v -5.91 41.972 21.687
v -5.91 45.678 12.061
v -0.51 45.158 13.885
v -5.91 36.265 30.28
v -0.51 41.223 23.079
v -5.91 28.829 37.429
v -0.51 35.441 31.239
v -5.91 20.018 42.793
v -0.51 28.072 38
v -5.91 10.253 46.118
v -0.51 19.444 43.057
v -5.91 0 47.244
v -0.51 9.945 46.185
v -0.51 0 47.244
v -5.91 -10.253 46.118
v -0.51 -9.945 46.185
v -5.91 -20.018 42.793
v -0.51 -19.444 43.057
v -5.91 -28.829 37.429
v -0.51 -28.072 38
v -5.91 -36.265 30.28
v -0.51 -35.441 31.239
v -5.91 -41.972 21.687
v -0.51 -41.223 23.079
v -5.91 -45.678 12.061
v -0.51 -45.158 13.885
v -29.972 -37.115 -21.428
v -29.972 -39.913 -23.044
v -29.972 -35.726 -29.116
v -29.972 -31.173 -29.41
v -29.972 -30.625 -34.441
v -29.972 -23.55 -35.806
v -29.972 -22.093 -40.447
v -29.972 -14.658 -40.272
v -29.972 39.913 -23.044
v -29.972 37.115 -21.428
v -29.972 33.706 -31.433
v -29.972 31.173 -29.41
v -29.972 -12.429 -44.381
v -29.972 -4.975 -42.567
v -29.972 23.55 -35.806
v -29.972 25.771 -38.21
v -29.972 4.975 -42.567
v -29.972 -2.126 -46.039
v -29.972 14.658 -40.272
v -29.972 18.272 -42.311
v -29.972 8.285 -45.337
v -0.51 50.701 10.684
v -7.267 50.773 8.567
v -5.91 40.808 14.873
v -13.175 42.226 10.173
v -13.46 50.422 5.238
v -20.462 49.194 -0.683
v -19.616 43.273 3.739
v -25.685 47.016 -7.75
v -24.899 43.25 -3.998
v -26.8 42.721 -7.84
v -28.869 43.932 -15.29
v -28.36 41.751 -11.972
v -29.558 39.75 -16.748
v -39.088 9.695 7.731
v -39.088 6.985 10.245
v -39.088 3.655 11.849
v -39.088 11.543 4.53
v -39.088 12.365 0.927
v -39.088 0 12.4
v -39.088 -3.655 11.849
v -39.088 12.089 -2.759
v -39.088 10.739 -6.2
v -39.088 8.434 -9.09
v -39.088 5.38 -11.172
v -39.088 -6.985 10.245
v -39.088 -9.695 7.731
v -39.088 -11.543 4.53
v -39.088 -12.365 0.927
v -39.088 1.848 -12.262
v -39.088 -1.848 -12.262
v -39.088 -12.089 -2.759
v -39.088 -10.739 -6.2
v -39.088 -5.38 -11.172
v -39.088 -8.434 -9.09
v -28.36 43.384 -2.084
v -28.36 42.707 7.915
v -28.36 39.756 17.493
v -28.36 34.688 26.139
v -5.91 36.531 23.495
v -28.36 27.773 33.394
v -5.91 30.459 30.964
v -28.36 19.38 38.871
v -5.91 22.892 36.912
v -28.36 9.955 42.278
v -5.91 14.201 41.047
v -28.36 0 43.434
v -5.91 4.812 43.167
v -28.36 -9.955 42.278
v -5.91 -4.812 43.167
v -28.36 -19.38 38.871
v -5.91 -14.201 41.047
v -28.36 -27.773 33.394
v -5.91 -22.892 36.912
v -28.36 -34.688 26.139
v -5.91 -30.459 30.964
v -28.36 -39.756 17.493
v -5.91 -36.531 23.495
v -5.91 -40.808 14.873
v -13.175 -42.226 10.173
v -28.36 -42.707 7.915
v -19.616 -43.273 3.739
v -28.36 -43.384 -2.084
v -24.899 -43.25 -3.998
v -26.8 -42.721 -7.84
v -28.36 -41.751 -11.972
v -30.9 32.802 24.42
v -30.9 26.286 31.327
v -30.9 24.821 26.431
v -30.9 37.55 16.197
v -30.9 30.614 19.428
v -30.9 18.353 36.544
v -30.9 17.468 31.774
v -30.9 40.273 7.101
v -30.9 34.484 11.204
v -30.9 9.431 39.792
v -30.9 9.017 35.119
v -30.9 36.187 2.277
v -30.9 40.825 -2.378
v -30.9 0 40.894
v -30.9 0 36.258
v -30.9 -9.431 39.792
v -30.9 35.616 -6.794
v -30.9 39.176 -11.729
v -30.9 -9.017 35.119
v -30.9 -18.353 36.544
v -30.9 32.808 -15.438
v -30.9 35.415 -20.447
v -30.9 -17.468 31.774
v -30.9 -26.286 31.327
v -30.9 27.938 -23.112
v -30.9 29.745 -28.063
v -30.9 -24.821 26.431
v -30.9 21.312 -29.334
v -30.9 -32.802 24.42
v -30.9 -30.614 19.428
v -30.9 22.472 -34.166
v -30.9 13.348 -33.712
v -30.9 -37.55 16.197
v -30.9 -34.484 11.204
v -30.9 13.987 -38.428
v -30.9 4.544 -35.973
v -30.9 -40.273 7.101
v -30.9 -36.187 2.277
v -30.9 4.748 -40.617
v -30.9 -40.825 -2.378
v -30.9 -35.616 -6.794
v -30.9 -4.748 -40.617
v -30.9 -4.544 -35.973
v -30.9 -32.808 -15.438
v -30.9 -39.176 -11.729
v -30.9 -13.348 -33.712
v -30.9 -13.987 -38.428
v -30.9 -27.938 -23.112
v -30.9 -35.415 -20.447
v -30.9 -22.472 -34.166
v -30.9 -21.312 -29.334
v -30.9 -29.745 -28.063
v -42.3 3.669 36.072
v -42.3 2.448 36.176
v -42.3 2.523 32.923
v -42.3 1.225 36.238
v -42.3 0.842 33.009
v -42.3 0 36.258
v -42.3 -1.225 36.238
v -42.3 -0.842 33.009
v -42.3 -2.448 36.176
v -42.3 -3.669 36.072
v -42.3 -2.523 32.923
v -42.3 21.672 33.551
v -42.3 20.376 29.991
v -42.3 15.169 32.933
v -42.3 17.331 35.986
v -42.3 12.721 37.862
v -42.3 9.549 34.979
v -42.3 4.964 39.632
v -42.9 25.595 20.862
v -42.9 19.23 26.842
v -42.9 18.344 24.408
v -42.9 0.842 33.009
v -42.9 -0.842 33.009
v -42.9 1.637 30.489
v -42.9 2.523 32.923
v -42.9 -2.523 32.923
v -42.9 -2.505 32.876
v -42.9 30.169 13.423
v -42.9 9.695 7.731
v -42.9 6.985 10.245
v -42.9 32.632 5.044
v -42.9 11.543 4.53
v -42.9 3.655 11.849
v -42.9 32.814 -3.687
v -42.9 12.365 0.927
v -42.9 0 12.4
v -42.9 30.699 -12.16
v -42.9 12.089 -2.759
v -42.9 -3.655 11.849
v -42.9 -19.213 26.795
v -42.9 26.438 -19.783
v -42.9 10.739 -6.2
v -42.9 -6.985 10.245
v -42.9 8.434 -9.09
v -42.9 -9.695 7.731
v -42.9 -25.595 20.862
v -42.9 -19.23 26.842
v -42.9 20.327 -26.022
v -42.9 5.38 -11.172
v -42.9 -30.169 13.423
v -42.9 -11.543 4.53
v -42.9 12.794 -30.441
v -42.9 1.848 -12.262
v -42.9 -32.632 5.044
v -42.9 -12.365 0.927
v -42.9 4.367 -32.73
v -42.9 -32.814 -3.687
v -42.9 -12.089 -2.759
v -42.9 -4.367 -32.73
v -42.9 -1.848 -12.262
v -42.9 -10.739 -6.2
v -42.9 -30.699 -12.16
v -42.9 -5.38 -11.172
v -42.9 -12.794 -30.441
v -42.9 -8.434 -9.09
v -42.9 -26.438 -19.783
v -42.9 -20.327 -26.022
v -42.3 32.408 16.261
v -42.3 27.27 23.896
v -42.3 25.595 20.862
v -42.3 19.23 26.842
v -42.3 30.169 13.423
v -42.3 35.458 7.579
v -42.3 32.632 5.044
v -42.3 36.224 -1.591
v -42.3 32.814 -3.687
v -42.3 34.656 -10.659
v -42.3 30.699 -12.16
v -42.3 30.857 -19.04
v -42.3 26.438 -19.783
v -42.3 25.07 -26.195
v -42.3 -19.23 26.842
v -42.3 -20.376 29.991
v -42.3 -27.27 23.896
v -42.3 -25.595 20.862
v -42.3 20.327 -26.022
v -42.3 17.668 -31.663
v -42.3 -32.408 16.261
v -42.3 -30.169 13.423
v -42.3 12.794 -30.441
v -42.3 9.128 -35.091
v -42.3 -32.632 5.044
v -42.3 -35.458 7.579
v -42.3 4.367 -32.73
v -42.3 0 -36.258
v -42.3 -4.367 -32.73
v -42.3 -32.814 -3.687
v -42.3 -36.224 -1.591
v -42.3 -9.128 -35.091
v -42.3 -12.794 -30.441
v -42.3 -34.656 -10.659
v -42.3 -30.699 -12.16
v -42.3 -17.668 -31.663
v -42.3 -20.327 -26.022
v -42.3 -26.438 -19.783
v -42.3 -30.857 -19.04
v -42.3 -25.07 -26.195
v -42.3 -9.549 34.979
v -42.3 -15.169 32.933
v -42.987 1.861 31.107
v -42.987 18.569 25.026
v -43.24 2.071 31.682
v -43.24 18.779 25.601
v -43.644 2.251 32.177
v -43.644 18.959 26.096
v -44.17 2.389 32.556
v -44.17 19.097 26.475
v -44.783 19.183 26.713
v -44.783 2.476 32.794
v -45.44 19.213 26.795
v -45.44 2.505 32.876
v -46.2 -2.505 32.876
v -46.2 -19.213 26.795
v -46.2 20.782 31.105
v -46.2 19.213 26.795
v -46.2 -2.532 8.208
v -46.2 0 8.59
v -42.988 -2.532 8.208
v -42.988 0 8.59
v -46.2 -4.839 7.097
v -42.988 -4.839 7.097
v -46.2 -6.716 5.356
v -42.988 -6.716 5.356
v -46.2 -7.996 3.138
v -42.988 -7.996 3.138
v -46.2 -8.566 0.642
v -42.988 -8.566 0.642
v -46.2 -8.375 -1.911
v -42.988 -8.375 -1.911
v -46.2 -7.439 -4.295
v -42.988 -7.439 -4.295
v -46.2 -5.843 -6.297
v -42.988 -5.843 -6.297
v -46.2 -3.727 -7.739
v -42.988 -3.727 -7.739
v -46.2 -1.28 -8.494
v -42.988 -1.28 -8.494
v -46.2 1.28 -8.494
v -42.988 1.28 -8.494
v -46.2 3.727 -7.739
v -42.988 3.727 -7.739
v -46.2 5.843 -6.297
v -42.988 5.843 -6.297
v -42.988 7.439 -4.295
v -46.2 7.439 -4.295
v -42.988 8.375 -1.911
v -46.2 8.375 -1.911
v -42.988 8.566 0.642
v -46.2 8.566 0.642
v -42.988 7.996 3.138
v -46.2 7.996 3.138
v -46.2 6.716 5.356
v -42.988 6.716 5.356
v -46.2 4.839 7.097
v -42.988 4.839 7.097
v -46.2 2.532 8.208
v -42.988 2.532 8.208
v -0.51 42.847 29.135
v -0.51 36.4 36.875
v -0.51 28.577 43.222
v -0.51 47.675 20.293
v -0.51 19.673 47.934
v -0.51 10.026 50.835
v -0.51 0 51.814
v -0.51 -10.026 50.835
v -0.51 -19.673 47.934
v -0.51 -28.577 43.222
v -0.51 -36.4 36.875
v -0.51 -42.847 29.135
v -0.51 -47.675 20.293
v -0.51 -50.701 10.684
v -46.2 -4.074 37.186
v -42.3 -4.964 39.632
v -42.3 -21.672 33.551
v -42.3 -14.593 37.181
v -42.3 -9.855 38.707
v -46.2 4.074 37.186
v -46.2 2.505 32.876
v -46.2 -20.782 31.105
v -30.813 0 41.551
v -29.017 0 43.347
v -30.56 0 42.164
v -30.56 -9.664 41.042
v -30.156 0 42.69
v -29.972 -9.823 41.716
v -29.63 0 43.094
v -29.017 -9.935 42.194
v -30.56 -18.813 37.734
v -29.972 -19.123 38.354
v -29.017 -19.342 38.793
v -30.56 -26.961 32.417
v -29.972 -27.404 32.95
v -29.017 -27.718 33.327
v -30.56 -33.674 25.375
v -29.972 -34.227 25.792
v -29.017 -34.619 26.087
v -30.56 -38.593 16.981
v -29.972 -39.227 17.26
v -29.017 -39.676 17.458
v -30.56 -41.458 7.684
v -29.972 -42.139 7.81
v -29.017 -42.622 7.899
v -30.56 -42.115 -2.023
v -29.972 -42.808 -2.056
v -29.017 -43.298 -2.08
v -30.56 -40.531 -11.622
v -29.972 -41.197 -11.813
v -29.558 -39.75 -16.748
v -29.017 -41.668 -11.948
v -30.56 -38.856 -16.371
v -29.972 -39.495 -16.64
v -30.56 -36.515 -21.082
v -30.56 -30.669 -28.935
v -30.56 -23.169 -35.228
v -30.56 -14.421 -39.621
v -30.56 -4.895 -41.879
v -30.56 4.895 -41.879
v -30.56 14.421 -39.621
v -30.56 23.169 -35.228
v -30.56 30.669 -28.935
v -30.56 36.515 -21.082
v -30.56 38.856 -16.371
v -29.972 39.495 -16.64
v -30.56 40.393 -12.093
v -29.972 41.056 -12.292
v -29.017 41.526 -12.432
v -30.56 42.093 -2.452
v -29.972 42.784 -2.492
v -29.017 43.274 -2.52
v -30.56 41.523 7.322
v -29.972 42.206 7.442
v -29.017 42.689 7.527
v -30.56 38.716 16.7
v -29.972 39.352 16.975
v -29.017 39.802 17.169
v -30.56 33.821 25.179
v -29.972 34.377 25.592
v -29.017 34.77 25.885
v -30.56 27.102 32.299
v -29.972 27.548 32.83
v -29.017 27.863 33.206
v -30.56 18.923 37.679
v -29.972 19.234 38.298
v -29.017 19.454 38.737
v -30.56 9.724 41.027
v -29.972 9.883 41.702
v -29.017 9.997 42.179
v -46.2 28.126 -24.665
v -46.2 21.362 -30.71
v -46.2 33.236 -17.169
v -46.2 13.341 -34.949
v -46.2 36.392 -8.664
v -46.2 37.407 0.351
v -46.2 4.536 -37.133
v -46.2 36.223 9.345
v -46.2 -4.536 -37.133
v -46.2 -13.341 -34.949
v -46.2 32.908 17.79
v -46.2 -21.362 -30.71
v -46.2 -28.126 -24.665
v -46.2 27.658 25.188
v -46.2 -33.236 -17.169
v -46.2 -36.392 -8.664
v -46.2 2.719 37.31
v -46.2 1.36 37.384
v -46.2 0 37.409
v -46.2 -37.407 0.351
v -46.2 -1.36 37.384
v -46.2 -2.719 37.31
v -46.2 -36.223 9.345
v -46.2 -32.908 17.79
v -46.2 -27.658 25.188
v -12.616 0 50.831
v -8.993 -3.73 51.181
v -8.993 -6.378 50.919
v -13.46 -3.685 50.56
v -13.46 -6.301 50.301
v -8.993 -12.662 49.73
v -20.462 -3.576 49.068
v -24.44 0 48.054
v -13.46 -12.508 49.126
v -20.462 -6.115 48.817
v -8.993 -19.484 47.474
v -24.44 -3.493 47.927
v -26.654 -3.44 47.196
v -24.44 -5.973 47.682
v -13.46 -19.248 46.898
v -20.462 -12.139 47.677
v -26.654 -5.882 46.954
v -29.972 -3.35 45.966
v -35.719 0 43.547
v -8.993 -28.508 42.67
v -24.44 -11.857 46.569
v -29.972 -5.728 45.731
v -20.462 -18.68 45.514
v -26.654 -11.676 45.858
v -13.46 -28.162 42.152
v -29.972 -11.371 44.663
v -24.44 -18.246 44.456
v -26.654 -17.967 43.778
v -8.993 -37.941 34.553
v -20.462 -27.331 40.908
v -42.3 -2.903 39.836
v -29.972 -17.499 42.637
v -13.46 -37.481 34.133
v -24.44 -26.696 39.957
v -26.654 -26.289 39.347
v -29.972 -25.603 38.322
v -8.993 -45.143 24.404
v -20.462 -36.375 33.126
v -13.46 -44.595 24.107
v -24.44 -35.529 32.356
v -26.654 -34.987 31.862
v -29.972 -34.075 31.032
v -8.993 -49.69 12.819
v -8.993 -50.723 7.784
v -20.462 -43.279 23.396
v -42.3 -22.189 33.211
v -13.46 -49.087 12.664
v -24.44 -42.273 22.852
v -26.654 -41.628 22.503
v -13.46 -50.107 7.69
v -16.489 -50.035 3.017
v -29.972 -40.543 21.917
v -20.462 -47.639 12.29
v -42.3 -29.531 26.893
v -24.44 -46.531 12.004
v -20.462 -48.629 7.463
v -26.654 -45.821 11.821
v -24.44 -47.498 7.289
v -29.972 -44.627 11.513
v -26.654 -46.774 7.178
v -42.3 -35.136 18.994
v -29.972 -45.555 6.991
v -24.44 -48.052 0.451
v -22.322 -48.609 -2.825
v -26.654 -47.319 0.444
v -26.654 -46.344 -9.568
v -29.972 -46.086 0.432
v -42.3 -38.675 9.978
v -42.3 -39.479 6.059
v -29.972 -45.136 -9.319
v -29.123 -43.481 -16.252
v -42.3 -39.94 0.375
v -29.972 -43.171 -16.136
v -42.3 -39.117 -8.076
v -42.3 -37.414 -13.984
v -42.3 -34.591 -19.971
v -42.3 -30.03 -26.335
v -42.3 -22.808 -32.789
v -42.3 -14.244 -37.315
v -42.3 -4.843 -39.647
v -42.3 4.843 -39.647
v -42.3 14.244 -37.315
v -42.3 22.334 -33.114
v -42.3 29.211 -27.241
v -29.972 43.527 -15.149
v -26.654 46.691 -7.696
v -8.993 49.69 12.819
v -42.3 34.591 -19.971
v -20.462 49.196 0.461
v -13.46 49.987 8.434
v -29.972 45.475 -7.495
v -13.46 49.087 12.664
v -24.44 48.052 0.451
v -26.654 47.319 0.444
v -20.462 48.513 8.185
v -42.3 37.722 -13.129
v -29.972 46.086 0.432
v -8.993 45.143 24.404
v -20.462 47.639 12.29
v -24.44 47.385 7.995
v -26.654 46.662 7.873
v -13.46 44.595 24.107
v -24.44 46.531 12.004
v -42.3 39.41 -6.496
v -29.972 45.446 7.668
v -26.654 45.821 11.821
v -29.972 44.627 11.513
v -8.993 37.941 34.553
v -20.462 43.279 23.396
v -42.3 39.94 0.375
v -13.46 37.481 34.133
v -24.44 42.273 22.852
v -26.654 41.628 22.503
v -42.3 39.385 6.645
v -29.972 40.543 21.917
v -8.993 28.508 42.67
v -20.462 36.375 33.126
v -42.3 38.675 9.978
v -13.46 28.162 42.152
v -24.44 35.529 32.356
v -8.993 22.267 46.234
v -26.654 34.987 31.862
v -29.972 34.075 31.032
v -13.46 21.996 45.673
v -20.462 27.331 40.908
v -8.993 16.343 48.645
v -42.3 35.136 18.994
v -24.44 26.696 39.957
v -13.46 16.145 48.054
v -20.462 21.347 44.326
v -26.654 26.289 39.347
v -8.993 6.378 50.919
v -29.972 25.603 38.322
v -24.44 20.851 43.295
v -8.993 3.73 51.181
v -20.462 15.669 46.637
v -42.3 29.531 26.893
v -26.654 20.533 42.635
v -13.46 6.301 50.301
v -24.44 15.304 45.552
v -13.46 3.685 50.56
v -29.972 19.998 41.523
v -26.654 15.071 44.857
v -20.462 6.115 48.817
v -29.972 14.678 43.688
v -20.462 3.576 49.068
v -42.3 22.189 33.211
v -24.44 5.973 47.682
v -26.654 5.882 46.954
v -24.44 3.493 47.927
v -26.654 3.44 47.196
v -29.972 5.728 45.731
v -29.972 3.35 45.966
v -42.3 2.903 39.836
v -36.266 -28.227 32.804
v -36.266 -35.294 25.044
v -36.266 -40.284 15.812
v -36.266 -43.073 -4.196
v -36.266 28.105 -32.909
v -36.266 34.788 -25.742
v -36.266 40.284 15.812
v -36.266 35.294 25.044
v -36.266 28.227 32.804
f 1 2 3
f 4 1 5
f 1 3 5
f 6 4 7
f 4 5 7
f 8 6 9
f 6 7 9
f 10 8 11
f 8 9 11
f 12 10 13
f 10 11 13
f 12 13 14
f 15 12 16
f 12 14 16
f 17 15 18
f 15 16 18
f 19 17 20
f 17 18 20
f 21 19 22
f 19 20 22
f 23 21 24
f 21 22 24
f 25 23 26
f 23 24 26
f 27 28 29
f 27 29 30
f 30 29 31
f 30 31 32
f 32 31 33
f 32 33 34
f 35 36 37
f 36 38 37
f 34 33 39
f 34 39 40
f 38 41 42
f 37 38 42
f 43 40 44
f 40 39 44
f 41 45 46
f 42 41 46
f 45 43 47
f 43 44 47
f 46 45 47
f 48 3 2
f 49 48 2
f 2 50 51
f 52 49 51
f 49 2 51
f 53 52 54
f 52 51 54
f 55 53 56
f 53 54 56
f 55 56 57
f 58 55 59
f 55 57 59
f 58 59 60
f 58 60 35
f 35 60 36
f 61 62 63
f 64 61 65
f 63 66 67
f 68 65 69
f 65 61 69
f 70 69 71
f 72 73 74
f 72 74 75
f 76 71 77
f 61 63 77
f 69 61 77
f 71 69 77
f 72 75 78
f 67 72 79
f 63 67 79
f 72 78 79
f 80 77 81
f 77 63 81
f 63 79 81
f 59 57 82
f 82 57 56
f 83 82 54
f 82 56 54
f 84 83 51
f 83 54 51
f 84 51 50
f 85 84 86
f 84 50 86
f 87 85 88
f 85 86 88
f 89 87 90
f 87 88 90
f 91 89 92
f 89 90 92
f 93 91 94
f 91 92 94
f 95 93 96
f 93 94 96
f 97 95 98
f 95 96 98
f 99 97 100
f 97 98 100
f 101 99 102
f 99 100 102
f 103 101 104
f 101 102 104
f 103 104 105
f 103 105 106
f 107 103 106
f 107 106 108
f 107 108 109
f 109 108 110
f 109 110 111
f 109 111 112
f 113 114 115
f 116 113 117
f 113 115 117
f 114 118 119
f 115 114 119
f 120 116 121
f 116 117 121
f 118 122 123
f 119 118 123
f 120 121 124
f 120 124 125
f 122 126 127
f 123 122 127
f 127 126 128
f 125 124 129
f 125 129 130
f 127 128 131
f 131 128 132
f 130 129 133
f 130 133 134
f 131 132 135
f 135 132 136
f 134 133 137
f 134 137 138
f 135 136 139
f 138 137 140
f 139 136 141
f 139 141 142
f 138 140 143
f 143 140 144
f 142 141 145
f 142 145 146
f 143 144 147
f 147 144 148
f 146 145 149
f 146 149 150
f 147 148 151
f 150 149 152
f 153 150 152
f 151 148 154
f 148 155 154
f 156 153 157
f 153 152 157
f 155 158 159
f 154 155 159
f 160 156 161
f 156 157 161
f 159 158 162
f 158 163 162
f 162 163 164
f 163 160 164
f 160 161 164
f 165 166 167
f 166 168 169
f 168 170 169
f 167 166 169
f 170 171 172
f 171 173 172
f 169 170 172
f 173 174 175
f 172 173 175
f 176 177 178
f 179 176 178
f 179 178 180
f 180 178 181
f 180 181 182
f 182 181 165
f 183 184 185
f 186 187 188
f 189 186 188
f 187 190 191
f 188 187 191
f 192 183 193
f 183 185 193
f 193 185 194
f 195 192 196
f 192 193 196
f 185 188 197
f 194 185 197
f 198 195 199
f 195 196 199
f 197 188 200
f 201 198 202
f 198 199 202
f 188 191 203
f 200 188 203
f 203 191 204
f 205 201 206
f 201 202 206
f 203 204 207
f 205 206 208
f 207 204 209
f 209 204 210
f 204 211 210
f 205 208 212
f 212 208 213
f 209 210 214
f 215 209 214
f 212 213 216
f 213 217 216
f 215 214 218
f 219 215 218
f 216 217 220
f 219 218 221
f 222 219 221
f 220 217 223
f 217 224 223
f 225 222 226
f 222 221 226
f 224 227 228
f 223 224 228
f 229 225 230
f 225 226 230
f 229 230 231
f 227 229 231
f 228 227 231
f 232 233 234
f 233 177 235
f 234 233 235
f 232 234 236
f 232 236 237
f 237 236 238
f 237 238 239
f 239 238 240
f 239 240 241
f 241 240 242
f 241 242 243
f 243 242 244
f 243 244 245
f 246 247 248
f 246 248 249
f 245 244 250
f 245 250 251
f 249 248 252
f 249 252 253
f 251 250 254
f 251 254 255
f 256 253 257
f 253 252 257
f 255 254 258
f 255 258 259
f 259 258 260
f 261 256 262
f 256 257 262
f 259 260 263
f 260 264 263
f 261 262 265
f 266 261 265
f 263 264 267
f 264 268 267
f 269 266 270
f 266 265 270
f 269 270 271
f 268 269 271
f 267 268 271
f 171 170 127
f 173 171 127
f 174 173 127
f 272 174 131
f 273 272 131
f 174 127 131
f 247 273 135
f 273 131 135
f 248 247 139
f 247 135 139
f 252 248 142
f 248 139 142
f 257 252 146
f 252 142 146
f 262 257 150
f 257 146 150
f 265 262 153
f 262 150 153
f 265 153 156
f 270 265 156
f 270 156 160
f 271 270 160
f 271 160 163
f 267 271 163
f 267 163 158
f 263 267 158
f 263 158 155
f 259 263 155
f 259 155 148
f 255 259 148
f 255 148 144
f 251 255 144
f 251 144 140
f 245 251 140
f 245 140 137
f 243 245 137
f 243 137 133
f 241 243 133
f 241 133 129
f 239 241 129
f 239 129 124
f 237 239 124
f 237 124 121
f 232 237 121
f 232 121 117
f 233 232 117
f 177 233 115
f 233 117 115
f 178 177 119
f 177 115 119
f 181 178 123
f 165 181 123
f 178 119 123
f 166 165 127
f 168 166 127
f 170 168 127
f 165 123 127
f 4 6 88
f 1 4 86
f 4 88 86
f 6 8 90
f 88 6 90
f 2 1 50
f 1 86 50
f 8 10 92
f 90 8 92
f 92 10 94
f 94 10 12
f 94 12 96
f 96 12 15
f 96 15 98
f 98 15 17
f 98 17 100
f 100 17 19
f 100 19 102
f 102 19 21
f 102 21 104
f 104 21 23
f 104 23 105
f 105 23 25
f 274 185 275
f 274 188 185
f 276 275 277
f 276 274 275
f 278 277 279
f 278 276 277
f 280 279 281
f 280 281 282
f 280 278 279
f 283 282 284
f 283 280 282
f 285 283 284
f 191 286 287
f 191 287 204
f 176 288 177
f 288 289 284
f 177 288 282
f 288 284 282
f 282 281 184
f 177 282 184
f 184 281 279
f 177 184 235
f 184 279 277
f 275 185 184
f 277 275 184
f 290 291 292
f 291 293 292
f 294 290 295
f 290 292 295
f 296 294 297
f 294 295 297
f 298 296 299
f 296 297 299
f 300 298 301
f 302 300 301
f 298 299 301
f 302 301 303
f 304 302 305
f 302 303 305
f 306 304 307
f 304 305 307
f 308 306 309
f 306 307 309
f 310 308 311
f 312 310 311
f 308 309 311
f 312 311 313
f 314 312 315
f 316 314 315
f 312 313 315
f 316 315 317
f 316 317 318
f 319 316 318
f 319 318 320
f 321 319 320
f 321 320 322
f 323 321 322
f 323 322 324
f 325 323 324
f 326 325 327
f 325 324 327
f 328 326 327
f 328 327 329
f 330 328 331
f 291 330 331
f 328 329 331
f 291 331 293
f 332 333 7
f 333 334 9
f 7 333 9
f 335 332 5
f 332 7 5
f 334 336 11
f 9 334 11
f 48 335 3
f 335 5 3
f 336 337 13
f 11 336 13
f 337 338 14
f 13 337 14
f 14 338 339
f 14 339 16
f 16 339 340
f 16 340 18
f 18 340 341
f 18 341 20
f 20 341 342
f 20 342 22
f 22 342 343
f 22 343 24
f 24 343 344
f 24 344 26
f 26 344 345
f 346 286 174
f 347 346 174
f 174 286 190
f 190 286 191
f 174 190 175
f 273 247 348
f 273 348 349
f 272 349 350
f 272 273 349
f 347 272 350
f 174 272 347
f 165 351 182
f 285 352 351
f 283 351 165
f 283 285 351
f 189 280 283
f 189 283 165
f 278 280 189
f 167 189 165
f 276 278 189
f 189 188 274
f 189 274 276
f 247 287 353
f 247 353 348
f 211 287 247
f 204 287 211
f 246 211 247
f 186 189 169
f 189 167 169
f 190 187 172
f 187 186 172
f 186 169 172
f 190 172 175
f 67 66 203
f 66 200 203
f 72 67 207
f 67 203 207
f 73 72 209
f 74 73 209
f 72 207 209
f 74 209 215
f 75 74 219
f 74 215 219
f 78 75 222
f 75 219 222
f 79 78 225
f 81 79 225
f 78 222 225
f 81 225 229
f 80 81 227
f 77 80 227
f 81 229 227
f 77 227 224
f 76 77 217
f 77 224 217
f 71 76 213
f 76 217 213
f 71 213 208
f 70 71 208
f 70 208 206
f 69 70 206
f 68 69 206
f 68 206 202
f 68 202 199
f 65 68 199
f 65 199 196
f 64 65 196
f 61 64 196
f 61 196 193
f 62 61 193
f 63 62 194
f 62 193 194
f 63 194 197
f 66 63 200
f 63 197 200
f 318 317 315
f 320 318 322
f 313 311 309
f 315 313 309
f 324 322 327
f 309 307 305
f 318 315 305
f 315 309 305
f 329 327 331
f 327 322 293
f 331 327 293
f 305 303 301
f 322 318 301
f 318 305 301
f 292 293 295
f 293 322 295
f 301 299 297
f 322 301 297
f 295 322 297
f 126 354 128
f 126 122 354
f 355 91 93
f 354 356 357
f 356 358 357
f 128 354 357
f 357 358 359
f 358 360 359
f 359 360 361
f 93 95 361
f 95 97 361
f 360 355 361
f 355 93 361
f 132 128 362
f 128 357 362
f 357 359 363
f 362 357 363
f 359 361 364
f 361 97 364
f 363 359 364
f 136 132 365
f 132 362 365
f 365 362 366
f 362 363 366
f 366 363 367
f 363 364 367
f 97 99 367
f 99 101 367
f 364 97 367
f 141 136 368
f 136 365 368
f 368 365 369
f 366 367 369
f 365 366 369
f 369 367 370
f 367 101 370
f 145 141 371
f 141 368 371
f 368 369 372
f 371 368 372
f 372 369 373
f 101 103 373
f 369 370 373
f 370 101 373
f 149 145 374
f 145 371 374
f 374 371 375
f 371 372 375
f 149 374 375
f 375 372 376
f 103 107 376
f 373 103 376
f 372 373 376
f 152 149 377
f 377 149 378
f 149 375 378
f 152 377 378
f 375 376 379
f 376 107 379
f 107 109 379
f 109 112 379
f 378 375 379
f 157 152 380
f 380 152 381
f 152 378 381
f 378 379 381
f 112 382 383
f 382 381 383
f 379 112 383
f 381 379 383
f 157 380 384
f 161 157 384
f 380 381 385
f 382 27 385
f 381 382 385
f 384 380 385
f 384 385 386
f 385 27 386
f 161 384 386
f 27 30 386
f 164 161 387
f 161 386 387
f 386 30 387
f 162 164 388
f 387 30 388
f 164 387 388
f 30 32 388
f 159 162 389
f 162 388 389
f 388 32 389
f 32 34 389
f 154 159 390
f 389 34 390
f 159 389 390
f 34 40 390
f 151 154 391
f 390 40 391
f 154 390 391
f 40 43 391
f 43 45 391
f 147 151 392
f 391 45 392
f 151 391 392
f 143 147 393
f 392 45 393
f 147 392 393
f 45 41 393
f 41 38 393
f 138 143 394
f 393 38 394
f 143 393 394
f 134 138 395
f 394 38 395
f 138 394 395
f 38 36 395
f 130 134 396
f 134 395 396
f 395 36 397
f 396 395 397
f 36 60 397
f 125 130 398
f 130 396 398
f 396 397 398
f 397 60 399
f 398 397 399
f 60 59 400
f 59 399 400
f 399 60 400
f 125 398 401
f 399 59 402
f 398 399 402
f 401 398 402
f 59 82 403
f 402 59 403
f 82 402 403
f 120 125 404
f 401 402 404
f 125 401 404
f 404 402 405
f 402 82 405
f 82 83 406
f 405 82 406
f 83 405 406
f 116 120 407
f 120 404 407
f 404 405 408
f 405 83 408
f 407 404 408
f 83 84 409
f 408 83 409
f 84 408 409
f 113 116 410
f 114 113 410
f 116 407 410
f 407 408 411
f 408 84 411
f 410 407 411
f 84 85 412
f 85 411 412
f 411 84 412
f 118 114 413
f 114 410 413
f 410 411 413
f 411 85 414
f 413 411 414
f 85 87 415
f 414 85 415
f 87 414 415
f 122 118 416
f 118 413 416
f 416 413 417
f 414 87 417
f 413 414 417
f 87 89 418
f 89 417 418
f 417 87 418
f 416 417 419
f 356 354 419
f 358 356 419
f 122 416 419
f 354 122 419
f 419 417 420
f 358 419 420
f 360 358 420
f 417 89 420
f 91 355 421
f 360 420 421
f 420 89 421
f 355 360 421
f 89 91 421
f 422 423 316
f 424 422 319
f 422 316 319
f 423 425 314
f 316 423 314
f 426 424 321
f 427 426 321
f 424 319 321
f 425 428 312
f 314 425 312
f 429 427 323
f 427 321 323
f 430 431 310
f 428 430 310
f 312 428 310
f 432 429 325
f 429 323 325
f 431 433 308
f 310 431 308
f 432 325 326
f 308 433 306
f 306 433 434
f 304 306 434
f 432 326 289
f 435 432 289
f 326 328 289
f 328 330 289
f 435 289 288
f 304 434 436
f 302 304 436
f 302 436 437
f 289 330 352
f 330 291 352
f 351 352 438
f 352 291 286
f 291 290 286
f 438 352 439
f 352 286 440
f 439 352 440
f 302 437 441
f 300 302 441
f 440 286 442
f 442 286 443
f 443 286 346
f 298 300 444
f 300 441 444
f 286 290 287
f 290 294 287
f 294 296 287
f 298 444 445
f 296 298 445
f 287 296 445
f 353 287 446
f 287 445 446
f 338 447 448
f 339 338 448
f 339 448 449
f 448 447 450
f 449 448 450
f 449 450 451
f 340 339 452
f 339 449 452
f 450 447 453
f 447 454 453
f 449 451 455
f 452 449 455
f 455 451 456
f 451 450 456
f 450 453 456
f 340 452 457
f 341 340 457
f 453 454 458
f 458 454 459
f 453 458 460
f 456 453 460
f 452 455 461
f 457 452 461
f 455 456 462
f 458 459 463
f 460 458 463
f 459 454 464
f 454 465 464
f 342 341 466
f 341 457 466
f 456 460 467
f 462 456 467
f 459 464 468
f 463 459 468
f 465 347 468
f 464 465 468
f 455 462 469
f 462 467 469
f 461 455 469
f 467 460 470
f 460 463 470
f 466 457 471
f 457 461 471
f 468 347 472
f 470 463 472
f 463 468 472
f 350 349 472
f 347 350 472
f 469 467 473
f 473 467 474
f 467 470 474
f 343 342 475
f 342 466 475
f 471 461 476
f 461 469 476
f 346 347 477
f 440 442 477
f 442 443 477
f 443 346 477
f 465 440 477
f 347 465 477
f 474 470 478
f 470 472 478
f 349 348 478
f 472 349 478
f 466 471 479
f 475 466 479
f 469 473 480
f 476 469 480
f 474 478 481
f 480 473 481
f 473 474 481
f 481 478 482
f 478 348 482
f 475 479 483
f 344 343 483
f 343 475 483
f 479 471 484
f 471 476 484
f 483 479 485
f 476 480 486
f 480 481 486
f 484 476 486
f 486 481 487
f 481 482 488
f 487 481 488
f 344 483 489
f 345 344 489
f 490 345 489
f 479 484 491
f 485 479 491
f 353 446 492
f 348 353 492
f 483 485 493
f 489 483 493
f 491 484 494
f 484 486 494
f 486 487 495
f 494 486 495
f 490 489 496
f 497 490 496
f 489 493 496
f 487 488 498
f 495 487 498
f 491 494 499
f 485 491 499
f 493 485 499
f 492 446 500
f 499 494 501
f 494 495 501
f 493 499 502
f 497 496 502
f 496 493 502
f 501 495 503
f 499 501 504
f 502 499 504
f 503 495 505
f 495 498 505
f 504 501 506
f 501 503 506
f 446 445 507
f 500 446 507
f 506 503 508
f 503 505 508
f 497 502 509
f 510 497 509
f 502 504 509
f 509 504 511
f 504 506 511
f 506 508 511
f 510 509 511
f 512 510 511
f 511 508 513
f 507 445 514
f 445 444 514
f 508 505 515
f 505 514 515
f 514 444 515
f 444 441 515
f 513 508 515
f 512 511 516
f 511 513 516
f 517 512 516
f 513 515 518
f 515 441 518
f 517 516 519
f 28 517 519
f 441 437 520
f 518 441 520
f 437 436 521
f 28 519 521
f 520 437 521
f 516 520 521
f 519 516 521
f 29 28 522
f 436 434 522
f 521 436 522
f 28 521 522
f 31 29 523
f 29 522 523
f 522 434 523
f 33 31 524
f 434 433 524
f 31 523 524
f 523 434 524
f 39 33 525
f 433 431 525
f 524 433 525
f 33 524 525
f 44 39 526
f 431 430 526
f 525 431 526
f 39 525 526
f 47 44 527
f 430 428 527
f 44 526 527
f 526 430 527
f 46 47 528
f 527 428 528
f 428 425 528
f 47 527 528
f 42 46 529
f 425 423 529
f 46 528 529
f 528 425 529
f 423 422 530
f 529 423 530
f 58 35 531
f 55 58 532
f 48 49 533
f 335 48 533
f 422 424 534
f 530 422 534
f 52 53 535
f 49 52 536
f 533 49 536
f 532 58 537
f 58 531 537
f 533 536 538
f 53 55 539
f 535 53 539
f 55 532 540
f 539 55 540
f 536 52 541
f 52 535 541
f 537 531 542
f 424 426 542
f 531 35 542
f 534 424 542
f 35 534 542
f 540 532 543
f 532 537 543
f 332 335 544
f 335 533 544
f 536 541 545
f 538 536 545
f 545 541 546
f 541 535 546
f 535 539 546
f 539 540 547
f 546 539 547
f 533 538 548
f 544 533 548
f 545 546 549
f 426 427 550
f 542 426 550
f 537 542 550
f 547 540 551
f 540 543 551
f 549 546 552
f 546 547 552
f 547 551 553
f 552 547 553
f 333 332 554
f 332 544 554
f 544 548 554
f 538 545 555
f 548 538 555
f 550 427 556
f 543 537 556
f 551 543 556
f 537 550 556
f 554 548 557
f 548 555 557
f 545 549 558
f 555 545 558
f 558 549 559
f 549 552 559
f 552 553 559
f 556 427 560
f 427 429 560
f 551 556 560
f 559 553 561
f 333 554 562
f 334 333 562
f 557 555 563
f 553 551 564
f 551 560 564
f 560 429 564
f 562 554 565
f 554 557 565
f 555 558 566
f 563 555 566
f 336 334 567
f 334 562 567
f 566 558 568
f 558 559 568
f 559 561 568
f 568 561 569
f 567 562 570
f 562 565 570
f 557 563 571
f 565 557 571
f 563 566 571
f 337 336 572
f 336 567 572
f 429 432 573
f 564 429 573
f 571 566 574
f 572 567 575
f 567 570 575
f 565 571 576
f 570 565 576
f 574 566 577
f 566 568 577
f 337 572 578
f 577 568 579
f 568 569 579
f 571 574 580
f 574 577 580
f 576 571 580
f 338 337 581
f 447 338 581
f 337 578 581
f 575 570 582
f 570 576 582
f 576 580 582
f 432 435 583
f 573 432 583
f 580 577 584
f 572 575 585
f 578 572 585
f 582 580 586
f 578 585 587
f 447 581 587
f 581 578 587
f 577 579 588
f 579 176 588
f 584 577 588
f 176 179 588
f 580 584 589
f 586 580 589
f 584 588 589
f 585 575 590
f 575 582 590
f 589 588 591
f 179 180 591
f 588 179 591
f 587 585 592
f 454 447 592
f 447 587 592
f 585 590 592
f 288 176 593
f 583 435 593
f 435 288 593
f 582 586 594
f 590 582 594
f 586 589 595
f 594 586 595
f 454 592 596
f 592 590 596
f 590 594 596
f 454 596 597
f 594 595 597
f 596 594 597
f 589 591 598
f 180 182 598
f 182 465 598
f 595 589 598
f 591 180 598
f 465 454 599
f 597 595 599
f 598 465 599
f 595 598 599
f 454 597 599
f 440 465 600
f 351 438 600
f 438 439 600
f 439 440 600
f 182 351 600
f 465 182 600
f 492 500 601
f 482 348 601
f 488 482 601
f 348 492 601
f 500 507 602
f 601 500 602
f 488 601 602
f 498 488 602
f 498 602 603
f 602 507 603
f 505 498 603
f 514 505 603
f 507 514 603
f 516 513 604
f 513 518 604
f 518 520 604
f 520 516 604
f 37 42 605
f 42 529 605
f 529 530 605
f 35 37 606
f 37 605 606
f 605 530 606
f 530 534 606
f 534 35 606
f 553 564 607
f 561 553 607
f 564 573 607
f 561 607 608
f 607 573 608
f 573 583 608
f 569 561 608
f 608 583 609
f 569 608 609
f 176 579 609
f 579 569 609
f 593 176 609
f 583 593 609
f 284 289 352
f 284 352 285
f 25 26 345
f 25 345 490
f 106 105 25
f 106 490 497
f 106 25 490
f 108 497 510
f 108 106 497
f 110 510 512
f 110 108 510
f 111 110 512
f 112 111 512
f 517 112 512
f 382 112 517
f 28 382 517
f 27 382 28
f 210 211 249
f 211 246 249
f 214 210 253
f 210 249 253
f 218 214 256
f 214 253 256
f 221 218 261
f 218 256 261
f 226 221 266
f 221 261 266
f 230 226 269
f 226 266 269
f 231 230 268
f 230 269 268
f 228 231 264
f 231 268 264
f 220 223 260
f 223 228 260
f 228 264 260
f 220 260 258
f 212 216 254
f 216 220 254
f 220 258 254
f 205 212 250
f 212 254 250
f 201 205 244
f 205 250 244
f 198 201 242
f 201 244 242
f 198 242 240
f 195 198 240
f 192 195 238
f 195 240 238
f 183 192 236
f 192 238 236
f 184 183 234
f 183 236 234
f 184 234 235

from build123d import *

# Parameters (mm, degrees)
FILLET1_R          = 2.54
SKETCH9_R          = 35.052
CUT_EXTRUDE4_DEPTH = 57.912
SKETCH10_W         = 58.015232171
SKETCH10_H         = 28.829548031
CUT_REVOLVE2_ANGLE = 120
CUT_EXTRUDE5_START = -31.75
SKETCH11_W         = 5.08
SKETCH11_H         = 17.78
CUT_EXTRUDE5_DEPTH = 31.75
FILLET2_R          = 2.54


with BuildPart() as part:
    # Sketch1 → Revolve1 (revolve)
    with BuildSketch(Plane.XY, mode=Mode.PRIVATE) as revolve1_sk:
        with BuildLine():
            Line((-39.088, 0), (-39.088, 12.4))
            Line((-39.088, 12.4), (-42.39, 12.4))
            Line((-42.39, 12.4), (-42.9, 12.4))
            Line((-42.9, 12.4), (-42.9, 33.02))
            Line((-42.9, 33.02), (-42.3, 33.02))
            Line((-42.3, 33.02), (-42.3, 36.2585))
            Line((-42.3, 36.2585), (-30.9, 36.2585))
            Line((-30.9, 36.2585), (-30.9, 43.434))
            Line((-30.9, 43.434), (-5.909999996, 43.434))
            Line((-5.909999996, 43.434), (-5.909999996, 47.244))
            Line((-5.909999996, 47.244), (-0.509999996, 47.244))
            Line((-0.509999996, 47.244), (-0.509999996, 51.81439996))
            ThreePointArc((-0.509999996, 51.81439996), (-24.440435702, 48.054407509), (-46.2, 37.409002026))
            Line((-46.2, 37.409002026), (-46.2, 8.59))
            Line((-46.2, 8.59), (-42.988, 8.59))
            Line((-42.988, 8.59), (-42.988, 0))
            Line((-42.988, 0), (-39.088, 0))
        make_face()
    revolve(revolve1_sk.sketch.rotate(Axis((-42.988, 0, 0), (1, 0, 0)), 90), axis=Axis((-42.988, 0, 0), (1, 0, 0)))

    # Fillet1
    fillet1_edges = [part.edges().sort_by_distance(p)[0] for p in [
        (-30.9, 0, -43.434),
    ]]
    fillet(fillet1_edges, radius=FILLET1_R)

    # Sketch9 → Cut-Extrude4 (cut)
    with BuildSketch(Plane(origin=(0, 0, 0), x_dir=(1, 0, 0), z_dir=(0, -0.8660254037844416, 0.49999999999999495))):
        with Locations((5.08, 0)):
            Circle(SKETCH9_R)
    cut_extrude4 = extrude(amount=-CUT_EXTRUDE4_DEPTH, mode=Mode.SUBTRACT)

    # Mirror3: Cut-Extrude4 across plane
    add(cut_extrude4.mirror(Plane.ZX), mode=Mode.SUBTRACT)

    # Sketch10 → Cut-Revolve2 (revolve, cut)
    with BuildSketch(Plane(origin=(0, 0, 0), x_dir=(1, 0, 0), z_dir=(0, -0.49999999999999495, -0.8660254037844416))):
        with Locations((-0.964383914, -42.303173001)):
            Rectangle(SKETCH10_W, SKETCH10_H)
    revolve(axis=Axis((-48.7934, 0, 0), (-1, 0, 0)), revolution_arc=CUT_REVOLVE2_ANGLE, mode=Mode.SUBTRACT)

    # Sketch11 → Cut-Extrude5 (cut)
    with BuildSketch(Plane(origin=(0, 0, 0), x_dir=(1, 0, 0), z_dir=(0, -0.34202014332565933, -0.9396926207859118)).offset(CUT_EXTRUDE5_START)):
        with Locations((-44.84, 0)):
            Rectangle(SKETCH11_W, SKETCH11_H)
    cut_extrude5 = extrude(amount=-CUT_EXTRUDE5_DEPTH, mode=Mode.SUBTRACT)

    # Fillet2
    fillet2_edges = [part.edges().sort_by_distance(p)[0] for p in [
        (-42.9, 10.859139551, 29.83524071),
    ]]
    fillet(fillet2_edges, radius=FILLET2_R)

    # Mirror4: Cut-Extrude5 across plane
    add(cut_extrude5.mirror(Plane.ZX), mode=Mode.SUBTRACT)


solid = part.part
